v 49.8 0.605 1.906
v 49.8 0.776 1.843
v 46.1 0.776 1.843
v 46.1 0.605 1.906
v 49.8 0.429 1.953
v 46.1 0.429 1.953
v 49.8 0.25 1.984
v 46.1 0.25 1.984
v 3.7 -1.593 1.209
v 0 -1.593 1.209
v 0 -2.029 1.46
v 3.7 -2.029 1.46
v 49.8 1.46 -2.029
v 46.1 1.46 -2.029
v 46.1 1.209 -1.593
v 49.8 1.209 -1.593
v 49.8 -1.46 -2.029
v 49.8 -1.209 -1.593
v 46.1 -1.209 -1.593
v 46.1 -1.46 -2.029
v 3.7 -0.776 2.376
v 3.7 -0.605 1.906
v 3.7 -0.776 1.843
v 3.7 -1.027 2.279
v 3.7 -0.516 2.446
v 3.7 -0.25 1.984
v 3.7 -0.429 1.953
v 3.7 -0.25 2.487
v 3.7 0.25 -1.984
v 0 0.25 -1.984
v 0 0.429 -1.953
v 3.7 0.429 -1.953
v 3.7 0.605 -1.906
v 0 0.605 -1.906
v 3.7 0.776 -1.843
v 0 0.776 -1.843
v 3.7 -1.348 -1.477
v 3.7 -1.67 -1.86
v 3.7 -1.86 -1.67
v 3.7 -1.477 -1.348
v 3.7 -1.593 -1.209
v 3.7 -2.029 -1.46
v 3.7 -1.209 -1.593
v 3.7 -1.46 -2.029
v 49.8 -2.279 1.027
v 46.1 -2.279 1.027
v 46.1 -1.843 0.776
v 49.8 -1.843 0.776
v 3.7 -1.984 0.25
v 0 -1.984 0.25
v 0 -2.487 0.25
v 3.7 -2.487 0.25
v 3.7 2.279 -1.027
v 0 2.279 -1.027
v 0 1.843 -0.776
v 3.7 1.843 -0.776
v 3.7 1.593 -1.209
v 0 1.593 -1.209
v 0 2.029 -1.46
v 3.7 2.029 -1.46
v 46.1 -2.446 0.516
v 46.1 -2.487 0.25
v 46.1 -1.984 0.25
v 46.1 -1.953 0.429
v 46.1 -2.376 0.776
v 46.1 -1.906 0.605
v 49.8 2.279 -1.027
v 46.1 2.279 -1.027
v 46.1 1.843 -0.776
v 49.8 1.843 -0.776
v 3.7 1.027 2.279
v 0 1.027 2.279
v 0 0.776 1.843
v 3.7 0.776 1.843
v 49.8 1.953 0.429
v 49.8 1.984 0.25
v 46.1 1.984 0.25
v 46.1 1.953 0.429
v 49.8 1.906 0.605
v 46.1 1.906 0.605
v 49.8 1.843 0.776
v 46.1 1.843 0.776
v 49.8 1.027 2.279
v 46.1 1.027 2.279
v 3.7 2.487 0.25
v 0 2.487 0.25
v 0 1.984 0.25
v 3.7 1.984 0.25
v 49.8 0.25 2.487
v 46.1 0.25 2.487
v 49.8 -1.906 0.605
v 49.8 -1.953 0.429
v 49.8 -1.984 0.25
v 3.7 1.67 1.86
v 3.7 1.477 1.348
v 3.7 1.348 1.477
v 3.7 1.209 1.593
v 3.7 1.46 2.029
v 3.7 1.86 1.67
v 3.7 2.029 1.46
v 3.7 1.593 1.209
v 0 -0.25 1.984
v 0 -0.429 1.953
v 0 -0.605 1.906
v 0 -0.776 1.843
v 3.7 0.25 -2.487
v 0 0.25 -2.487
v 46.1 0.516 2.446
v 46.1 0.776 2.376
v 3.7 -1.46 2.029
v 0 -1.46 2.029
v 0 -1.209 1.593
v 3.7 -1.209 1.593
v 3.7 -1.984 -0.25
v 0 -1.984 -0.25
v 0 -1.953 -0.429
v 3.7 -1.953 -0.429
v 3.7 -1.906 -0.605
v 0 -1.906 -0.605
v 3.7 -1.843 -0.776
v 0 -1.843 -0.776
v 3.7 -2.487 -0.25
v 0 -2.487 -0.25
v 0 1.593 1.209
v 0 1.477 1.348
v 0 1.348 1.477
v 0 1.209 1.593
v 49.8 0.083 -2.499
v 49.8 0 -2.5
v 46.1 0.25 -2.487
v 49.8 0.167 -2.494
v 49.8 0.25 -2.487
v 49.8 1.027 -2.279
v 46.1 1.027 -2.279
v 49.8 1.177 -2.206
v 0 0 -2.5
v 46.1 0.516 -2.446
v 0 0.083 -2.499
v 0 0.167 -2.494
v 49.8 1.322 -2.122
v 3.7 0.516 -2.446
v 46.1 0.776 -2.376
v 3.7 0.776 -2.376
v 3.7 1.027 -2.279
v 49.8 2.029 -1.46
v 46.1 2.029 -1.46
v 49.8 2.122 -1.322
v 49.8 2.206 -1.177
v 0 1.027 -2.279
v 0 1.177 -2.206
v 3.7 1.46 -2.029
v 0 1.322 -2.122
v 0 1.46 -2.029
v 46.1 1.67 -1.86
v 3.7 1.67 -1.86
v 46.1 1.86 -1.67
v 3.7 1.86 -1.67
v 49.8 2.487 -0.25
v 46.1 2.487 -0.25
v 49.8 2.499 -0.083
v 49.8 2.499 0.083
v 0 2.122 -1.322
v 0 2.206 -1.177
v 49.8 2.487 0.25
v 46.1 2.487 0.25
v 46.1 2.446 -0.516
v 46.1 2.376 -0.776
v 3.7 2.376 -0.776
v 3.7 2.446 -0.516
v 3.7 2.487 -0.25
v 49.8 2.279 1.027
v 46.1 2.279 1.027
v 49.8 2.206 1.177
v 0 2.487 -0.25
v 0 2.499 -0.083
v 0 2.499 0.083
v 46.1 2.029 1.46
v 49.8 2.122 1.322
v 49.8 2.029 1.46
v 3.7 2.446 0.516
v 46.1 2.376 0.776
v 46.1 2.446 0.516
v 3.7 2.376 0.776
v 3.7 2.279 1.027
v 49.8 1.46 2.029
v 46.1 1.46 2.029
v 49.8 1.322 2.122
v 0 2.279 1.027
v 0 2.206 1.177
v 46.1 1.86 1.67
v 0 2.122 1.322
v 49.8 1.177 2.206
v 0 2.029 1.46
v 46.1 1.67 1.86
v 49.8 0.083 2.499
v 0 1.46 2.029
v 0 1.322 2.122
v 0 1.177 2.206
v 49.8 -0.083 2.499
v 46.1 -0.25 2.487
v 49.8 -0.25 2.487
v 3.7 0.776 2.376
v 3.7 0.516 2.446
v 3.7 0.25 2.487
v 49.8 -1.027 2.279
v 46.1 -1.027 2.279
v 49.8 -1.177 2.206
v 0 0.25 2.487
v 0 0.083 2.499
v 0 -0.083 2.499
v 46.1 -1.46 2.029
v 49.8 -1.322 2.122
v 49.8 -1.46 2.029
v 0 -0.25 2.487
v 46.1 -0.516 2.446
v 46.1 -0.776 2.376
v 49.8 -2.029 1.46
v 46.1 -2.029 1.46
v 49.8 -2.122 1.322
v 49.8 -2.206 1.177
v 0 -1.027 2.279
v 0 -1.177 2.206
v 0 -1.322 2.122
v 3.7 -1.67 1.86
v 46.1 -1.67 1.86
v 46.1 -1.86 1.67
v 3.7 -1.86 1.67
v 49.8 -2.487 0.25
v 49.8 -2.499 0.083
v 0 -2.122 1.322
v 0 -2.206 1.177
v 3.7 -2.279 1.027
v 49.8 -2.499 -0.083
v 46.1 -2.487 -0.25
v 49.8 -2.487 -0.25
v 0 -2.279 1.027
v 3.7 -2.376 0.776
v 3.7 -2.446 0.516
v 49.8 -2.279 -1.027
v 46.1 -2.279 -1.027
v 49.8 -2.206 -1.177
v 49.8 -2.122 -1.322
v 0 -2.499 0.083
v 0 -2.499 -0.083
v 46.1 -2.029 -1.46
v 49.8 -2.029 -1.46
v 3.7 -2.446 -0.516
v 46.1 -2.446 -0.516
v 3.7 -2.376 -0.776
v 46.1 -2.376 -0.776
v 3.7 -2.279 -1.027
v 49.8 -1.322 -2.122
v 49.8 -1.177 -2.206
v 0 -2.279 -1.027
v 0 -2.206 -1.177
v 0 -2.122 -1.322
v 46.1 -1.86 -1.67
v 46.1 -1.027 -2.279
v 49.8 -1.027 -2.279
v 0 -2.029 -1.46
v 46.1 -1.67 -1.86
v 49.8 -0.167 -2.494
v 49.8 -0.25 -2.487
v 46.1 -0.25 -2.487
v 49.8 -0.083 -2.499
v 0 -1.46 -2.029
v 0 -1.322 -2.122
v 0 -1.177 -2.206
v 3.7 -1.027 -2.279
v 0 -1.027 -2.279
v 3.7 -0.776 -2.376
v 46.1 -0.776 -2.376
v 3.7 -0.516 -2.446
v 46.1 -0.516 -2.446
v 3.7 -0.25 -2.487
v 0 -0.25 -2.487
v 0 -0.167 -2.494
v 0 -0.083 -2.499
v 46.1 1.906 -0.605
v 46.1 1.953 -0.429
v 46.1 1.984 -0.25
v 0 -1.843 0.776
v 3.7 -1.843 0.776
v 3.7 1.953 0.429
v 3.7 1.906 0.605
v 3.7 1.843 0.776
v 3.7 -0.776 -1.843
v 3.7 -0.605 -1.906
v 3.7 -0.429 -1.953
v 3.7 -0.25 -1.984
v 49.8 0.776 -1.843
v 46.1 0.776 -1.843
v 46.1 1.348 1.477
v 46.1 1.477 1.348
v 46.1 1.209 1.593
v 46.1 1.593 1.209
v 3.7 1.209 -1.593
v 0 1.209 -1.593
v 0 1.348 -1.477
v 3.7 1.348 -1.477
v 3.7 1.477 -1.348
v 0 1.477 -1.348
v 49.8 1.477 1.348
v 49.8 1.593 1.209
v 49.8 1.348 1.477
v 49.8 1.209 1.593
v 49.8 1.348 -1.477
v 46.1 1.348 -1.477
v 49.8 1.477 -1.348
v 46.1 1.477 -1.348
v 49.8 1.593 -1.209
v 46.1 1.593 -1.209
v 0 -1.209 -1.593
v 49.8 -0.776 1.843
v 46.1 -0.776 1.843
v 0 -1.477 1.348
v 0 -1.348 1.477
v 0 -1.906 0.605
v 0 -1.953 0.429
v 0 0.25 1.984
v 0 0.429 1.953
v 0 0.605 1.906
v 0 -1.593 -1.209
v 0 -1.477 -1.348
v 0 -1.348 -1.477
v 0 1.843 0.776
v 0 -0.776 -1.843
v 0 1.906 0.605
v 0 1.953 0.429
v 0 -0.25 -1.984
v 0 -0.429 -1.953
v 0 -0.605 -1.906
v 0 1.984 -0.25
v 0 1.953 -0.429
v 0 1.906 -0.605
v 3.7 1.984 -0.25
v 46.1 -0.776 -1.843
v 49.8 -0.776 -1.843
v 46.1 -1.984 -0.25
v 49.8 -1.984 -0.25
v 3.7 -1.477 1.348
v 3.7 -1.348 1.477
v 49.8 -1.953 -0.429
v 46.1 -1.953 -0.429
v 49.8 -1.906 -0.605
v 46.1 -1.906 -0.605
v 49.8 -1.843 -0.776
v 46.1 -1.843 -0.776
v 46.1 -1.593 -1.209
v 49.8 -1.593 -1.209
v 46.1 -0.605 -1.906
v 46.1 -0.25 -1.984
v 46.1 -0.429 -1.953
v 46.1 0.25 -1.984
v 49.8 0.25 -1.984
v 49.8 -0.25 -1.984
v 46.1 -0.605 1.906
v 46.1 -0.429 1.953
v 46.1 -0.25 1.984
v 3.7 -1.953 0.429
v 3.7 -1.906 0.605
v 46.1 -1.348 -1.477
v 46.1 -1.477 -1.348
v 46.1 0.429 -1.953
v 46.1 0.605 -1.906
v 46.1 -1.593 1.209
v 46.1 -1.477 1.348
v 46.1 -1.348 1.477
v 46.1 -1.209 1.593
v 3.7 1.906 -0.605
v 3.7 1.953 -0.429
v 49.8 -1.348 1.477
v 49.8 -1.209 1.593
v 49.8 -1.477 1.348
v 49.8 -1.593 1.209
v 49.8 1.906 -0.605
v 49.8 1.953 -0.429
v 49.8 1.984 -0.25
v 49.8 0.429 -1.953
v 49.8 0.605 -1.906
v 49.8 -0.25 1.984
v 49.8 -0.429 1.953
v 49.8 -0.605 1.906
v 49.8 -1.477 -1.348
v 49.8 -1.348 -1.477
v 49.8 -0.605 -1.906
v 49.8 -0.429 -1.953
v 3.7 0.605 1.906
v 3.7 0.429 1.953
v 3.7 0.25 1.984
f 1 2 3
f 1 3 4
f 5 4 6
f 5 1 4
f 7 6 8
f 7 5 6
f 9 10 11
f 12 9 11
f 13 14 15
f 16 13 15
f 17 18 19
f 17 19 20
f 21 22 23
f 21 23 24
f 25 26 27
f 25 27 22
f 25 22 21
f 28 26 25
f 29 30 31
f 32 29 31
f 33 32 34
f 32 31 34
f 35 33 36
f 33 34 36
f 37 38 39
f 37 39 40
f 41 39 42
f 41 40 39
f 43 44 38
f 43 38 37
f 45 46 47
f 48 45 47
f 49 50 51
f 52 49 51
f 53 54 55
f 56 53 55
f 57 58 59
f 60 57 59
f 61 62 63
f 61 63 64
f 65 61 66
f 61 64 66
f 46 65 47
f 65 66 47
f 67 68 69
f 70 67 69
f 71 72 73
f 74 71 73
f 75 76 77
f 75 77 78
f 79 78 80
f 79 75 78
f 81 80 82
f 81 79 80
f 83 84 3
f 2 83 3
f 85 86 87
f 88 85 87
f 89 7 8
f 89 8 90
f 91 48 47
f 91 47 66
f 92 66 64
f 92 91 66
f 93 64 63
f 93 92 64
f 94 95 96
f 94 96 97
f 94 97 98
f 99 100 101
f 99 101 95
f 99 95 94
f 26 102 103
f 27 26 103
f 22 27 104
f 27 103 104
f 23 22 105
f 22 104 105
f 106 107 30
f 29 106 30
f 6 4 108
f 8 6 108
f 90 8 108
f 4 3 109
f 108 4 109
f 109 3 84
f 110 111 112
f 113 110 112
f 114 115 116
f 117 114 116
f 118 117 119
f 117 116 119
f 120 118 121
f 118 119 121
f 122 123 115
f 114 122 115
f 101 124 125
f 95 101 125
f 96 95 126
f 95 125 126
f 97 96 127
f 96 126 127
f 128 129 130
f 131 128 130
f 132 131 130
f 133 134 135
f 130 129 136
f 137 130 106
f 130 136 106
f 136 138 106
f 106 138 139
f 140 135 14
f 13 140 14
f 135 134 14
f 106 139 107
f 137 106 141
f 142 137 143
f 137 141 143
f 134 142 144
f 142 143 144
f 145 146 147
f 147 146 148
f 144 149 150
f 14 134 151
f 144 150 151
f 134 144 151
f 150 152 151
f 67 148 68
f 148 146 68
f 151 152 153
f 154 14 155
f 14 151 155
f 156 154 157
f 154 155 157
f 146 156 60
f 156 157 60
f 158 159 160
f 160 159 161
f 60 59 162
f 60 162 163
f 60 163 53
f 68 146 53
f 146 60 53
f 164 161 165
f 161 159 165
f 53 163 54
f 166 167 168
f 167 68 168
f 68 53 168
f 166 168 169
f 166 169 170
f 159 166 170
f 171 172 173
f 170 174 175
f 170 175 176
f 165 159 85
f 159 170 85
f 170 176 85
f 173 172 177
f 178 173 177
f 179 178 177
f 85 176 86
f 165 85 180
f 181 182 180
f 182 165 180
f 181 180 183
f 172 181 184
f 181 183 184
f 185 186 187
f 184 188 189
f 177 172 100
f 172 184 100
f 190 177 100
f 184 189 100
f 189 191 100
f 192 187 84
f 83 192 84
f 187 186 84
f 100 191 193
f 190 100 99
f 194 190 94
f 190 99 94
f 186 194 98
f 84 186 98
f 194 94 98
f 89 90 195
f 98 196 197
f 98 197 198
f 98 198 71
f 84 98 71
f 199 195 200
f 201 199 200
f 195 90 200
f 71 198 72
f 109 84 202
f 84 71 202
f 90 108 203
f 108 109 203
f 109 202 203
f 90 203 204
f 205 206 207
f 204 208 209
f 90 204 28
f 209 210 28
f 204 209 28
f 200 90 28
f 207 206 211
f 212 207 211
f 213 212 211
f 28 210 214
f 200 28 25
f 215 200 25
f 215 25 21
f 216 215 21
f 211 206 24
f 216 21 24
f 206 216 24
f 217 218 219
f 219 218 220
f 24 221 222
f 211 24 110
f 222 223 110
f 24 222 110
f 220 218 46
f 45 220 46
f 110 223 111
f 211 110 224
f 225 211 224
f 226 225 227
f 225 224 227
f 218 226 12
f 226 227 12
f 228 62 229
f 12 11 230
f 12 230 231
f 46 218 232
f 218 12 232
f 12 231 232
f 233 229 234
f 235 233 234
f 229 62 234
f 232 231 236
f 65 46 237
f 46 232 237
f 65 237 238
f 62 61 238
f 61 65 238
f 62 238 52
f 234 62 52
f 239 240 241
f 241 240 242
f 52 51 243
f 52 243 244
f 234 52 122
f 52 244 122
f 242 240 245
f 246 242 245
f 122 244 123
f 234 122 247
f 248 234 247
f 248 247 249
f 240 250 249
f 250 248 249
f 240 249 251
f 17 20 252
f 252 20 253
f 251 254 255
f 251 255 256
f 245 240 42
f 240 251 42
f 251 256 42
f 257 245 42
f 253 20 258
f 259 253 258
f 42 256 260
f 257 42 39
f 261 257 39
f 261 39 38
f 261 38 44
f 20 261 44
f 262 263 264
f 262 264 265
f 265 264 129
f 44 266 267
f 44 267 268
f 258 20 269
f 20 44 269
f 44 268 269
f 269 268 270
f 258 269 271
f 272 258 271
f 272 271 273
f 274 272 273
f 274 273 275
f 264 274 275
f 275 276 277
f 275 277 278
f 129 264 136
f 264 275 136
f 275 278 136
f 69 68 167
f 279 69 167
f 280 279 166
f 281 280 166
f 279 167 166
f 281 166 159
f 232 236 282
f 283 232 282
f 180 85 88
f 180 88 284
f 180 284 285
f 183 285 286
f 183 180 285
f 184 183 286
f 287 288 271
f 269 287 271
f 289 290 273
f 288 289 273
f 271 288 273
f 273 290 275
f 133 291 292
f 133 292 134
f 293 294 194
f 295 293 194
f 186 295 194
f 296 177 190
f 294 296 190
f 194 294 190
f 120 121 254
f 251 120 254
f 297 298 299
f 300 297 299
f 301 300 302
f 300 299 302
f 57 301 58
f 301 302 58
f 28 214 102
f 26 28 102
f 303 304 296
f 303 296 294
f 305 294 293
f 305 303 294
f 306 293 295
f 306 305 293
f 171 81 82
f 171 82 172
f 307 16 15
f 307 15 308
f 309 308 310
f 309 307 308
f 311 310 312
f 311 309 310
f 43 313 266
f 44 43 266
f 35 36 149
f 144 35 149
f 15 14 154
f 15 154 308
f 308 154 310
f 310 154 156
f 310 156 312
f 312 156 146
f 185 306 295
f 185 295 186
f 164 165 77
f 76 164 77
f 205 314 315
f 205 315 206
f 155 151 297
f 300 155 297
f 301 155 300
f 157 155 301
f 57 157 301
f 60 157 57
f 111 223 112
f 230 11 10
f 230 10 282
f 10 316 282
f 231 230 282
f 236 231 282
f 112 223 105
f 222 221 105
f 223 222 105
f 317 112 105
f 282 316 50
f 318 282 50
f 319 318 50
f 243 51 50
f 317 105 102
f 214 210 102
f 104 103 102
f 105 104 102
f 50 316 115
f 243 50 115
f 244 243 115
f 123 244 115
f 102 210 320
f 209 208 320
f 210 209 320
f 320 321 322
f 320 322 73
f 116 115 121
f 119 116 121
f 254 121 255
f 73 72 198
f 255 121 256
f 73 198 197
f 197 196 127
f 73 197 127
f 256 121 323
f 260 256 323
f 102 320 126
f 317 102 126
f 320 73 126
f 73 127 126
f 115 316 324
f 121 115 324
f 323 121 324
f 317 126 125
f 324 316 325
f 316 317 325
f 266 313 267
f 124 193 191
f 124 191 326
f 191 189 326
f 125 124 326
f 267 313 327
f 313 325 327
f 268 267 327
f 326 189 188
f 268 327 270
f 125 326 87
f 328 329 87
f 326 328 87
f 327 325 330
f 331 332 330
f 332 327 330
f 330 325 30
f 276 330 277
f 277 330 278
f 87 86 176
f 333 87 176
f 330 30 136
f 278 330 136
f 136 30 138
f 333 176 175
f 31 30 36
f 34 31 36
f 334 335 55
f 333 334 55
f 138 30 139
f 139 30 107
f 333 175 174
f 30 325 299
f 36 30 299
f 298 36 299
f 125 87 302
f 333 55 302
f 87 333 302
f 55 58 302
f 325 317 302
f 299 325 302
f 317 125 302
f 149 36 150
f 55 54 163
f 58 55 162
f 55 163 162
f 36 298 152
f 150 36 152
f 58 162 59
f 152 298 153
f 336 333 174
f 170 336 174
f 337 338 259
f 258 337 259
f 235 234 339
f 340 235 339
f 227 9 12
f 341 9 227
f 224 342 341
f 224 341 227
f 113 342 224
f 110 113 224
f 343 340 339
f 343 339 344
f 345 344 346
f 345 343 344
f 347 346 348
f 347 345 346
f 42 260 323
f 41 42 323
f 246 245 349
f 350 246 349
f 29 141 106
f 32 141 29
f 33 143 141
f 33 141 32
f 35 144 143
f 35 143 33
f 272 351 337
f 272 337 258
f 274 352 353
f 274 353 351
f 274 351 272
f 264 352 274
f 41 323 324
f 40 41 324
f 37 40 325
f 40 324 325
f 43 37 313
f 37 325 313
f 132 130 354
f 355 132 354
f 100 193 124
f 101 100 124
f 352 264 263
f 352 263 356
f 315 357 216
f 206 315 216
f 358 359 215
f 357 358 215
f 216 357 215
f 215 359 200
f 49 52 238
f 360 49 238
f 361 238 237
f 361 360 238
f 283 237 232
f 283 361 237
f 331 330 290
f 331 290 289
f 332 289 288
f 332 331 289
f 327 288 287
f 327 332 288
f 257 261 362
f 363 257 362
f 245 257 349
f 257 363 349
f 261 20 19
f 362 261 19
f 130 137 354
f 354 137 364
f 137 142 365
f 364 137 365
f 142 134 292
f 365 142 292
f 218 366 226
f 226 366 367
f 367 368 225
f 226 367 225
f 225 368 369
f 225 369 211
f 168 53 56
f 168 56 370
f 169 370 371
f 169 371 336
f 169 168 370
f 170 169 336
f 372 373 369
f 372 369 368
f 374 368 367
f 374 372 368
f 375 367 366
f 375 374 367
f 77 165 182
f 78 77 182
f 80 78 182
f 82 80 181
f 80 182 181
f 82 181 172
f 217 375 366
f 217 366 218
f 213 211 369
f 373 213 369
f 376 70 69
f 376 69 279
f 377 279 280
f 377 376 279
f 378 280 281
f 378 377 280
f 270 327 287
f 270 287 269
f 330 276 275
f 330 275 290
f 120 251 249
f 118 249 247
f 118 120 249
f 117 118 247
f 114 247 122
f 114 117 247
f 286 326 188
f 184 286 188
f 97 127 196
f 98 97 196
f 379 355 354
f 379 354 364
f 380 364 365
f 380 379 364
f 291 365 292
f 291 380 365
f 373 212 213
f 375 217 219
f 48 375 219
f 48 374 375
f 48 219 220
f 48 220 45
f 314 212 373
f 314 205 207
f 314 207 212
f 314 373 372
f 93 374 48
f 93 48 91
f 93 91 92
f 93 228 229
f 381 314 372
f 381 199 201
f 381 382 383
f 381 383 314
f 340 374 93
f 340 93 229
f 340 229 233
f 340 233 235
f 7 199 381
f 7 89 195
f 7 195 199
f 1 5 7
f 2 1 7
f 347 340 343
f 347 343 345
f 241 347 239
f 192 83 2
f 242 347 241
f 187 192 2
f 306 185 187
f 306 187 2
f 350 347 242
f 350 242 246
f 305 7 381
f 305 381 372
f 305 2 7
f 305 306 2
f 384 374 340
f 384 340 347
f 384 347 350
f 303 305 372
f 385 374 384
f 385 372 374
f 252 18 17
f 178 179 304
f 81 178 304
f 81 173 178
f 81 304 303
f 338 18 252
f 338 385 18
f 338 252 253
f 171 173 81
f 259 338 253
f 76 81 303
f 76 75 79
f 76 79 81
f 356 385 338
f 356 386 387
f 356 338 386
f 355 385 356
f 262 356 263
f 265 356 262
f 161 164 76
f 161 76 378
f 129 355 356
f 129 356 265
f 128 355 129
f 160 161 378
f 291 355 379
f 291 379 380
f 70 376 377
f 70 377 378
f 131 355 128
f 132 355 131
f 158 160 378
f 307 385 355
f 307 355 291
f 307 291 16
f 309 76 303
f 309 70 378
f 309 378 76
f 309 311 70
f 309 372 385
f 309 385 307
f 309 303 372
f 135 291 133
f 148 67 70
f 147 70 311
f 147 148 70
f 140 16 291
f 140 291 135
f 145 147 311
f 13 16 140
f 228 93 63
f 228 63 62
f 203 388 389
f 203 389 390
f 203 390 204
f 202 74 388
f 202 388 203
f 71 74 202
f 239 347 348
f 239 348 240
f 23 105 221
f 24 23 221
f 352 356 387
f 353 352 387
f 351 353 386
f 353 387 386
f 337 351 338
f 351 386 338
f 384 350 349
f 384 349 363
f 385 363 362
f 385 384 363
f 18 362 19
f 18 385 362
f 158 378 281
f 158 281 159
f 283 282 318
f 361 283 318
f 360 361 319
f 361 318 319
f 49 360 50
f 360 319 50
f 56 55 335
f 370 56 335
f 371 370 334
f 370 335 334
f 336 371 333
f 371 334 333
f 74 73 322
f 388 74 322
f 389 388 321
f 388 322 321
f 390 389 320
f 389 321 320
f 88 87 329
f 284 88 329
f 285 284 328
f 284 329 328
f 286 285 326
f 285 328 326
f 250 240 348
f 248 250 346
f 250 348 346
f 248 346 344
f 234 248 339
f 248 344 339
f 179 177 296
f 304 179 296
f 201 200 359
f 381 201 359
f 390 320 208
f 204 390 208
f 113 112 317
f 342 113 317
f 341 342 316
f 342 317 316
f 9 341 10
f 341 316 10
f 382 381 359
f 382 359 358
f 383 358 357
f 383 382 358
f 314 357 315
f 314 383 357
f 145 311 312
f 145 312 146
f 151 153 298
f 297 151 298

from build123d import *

# Parameters (mm, degrees)
SKETCH1_R           = 2.5
BOSS_EXTRUDE1_DEPTH = 49.8
CUT_EXTRUDE2_DEPTH  = 3.7


with BuildPart() as part:
    # Sketch1 → Boss-Extrude1 (new body)
    with BuildSketch(Plane(origin=(0, 0, 0), x_dir=(0, 0, -1), z_dir=(1, 0, 0))):
        Circle(SKETCH1_R)
    extrude(amount=BOSS_EXTRUDE1_DEPTH)

    # Sketch3 → Cut-Extrude2 (cut)
    with BuildSketch(Plane.ZY):
        with BuildLine():
            Line((-2.537715508, -0.25), (-1.984313483, -0.25))
            ThreePointArc((-1.984313483, -0.25), (-1.931851653, -0.51763809), (-1.843465886, -0.775650391))
            Line((-1.843465886, -0.775650391), (-2.322726098, -1.052351403))
            ThreePointArc((-2.322726098, -1.052351403), (-2.463110857, -0.659988565), (-2.537715508, -0.25))
        make_face()
        with BuildLine():
            Line((-2.537715508, 0.25), (-1.984313483, 0.25))
            ThreePointArc((-1.984313483, 0.25), (-1.931851653, 0.51763809), (-1.843465886, 0.775650391))
            Line((-1.843465886, 0.775650391), (-2.322726098, 1.052351403))
            ThreePointArc((-2.322726098, 1.052351403), (-2.463110857, 0.659988565), (-2.537715508, 0.25))
        make_face()
        with BuildLine():
            Line((-2.072726098, 1.485364105), (-1.593465886, 1.208663093))
            ThreePointArc((-1.593465886, 1.208663093), (-1.414213562, 1.414213562), (-1.208663093, 1.593465886))
            Line((-1.208663093, 1.593465886), (-1.485364105, 2.072726098))
            ThreePointArc((-1.485364105, 2.072726098), (-1.803122292, 1.803122292), (-2.072726098, 1.485364105))
        make_face()
        with BuildLine():
            Line((-1.052351403, 2.322726098), (-0.775650391, 1.843465886))
            ThreePointArc((-0.775650391, 1.843465886), (-0.51763809, 1.931851653), (-0.25, 1.984313483))
            Line((-0.25, 1.984313483), (-0.25, 2.537715508))
            ThreePointArc((-0.25, 2.537715508), (-0.659988565, 2.463110857), (-1.052351403, 2.322726098))
        make_face()
        with BuildLine():
            Line((0.25, 2.537715508), (0.25, 1.984313483))
            ThreePointArc((0.25, 1.984313483), (0.51763809, 1.931851653), (0.775650391, 1.843465886))
            Line((0.775650391, 1.843465886), (1.052351403, 2.322726098))
            ThreePointArc((1.052351403, 2.322726098), (0.659988565, 2.463110857), (0.25, 2.537715508))
        make_face()
        with BuildLine():
            Line((1.485364105, 2.072726098), (1.208663093, 1.593465886))
            ThreePointArc((1.208663093, 1.593465886), (1.414213562, 1.414213562), (1.593465886, 1.208663093))
            Line((1.593465886, 1.208663093), (2.072726098, 1.485364105))
            ThreePointArc((2.072726098, 1.485364105), (1.803122292, 1.803122292), (1.485364105, 2.072726098))
        make_face()
        with BuildLine():
            Line((2.322726098, 1.052351403), (1.843465886, 0.775650391))
            ThreePointArc((1.843465886, 0.775650391), (1.931851653, 0.51763809), (1.984313483, 0.25))
            Line((1.984313483, 0.25), (2.537715508, 0.25))
            ThreePointArc((2.537715508, 0.25), (2.463110857, 0.659988565), (2.322726098, 1.052351403))
        make_face()
        with BuildLine():
            Line((2.537715508, -0.25), (1.984313483, -0.25))
            ThreePointArc((1.984313483, -0.25), (1.931851653, -0.51763809), (1.843465886, -0.775650391))
            Line((1.843465886, -0.775650391), (2.322726098, -1.052351403))
            ThreePointArc((2.322726098, -1.052351403), (2.463110857, -0.659988565), (2.537715508, -0.25))
        make_face()
        with BuildLine():
            Line((2.072726098, -1.485364105), (1.593465886, -1.208663093))
            ThreePointArc((1.593465886, -1.208663093), (1.414213562, -1.414213562), (1.208663093, -1.593465886))
            Line((1.208663093, -1.593465886), (1.485364105, -2.072726098))
            ThreePointArc((1.485364105, -2.072726098), (1.803122292, -1.803122292), (2.072726098, -1.485364105))
        make_face()
        with BuildLine():
            Line((1.052351403, -2.322726098), (0.775650391, -1.843465886))
            ThreePointArc((0.775650391, -1.843465886), (0.51763809, -1.931851653), (0.25, -1.984313483))
            Line((0.25, -1.984313483), (0.25, -2.537715508))
            ThreePointArc((0.25, -2.537715508), (0.659988565, -2.463110857), (1.052351403, -2.322726098))
        make_face()
        with BuildLine():
            Line((-0.25, -2.537715508), (-0.25, -1.984313483))
            ThreePointArc((-0.25, -1.984313483), (-0.51763809, -1.931851653), (-0.775650391, -1.843465886))
            Line((-0.775650391, -1.843465886), (-1.052351403, -2.322726098))
            ThreePointArc((-1.052351403, -2.322726098), (-0.659988565, -2.463110857), (-0.25, -2.537715508))
        make_face()
        with BuildLine():
            Line((-1.485364105, -2.072726098), (-1.208663093, -1.593465886))
            ThreePointArc((-1.208663093, -1.593465886), (-1.414213562, -1.414213562), (-1.593465886, -1.208663093))
            Line((-1.593465886, -1.208663093), (-2.072726098, -1.485364105))
            ThreePointArc((-2.072726098, -1.485364105), (-1.803122292, -1.803122292), (-1.485364105, -2.072726098))
        make_face()
    cut_extrude2 = extrude(amount=-CUT_EXTRUDE2_DEPTH, mode=Mode.SUBTRACT)

    # Mirror1: Cut-Extrude2 across plane
    add(cut_extrude2.mirror(Plane(origin=(24.9, 0, 0), x_dir=(0, 0, 1), z_dir=(1, 0, 0))), mode=Mode.SUBTRACT)


solid = part.part
